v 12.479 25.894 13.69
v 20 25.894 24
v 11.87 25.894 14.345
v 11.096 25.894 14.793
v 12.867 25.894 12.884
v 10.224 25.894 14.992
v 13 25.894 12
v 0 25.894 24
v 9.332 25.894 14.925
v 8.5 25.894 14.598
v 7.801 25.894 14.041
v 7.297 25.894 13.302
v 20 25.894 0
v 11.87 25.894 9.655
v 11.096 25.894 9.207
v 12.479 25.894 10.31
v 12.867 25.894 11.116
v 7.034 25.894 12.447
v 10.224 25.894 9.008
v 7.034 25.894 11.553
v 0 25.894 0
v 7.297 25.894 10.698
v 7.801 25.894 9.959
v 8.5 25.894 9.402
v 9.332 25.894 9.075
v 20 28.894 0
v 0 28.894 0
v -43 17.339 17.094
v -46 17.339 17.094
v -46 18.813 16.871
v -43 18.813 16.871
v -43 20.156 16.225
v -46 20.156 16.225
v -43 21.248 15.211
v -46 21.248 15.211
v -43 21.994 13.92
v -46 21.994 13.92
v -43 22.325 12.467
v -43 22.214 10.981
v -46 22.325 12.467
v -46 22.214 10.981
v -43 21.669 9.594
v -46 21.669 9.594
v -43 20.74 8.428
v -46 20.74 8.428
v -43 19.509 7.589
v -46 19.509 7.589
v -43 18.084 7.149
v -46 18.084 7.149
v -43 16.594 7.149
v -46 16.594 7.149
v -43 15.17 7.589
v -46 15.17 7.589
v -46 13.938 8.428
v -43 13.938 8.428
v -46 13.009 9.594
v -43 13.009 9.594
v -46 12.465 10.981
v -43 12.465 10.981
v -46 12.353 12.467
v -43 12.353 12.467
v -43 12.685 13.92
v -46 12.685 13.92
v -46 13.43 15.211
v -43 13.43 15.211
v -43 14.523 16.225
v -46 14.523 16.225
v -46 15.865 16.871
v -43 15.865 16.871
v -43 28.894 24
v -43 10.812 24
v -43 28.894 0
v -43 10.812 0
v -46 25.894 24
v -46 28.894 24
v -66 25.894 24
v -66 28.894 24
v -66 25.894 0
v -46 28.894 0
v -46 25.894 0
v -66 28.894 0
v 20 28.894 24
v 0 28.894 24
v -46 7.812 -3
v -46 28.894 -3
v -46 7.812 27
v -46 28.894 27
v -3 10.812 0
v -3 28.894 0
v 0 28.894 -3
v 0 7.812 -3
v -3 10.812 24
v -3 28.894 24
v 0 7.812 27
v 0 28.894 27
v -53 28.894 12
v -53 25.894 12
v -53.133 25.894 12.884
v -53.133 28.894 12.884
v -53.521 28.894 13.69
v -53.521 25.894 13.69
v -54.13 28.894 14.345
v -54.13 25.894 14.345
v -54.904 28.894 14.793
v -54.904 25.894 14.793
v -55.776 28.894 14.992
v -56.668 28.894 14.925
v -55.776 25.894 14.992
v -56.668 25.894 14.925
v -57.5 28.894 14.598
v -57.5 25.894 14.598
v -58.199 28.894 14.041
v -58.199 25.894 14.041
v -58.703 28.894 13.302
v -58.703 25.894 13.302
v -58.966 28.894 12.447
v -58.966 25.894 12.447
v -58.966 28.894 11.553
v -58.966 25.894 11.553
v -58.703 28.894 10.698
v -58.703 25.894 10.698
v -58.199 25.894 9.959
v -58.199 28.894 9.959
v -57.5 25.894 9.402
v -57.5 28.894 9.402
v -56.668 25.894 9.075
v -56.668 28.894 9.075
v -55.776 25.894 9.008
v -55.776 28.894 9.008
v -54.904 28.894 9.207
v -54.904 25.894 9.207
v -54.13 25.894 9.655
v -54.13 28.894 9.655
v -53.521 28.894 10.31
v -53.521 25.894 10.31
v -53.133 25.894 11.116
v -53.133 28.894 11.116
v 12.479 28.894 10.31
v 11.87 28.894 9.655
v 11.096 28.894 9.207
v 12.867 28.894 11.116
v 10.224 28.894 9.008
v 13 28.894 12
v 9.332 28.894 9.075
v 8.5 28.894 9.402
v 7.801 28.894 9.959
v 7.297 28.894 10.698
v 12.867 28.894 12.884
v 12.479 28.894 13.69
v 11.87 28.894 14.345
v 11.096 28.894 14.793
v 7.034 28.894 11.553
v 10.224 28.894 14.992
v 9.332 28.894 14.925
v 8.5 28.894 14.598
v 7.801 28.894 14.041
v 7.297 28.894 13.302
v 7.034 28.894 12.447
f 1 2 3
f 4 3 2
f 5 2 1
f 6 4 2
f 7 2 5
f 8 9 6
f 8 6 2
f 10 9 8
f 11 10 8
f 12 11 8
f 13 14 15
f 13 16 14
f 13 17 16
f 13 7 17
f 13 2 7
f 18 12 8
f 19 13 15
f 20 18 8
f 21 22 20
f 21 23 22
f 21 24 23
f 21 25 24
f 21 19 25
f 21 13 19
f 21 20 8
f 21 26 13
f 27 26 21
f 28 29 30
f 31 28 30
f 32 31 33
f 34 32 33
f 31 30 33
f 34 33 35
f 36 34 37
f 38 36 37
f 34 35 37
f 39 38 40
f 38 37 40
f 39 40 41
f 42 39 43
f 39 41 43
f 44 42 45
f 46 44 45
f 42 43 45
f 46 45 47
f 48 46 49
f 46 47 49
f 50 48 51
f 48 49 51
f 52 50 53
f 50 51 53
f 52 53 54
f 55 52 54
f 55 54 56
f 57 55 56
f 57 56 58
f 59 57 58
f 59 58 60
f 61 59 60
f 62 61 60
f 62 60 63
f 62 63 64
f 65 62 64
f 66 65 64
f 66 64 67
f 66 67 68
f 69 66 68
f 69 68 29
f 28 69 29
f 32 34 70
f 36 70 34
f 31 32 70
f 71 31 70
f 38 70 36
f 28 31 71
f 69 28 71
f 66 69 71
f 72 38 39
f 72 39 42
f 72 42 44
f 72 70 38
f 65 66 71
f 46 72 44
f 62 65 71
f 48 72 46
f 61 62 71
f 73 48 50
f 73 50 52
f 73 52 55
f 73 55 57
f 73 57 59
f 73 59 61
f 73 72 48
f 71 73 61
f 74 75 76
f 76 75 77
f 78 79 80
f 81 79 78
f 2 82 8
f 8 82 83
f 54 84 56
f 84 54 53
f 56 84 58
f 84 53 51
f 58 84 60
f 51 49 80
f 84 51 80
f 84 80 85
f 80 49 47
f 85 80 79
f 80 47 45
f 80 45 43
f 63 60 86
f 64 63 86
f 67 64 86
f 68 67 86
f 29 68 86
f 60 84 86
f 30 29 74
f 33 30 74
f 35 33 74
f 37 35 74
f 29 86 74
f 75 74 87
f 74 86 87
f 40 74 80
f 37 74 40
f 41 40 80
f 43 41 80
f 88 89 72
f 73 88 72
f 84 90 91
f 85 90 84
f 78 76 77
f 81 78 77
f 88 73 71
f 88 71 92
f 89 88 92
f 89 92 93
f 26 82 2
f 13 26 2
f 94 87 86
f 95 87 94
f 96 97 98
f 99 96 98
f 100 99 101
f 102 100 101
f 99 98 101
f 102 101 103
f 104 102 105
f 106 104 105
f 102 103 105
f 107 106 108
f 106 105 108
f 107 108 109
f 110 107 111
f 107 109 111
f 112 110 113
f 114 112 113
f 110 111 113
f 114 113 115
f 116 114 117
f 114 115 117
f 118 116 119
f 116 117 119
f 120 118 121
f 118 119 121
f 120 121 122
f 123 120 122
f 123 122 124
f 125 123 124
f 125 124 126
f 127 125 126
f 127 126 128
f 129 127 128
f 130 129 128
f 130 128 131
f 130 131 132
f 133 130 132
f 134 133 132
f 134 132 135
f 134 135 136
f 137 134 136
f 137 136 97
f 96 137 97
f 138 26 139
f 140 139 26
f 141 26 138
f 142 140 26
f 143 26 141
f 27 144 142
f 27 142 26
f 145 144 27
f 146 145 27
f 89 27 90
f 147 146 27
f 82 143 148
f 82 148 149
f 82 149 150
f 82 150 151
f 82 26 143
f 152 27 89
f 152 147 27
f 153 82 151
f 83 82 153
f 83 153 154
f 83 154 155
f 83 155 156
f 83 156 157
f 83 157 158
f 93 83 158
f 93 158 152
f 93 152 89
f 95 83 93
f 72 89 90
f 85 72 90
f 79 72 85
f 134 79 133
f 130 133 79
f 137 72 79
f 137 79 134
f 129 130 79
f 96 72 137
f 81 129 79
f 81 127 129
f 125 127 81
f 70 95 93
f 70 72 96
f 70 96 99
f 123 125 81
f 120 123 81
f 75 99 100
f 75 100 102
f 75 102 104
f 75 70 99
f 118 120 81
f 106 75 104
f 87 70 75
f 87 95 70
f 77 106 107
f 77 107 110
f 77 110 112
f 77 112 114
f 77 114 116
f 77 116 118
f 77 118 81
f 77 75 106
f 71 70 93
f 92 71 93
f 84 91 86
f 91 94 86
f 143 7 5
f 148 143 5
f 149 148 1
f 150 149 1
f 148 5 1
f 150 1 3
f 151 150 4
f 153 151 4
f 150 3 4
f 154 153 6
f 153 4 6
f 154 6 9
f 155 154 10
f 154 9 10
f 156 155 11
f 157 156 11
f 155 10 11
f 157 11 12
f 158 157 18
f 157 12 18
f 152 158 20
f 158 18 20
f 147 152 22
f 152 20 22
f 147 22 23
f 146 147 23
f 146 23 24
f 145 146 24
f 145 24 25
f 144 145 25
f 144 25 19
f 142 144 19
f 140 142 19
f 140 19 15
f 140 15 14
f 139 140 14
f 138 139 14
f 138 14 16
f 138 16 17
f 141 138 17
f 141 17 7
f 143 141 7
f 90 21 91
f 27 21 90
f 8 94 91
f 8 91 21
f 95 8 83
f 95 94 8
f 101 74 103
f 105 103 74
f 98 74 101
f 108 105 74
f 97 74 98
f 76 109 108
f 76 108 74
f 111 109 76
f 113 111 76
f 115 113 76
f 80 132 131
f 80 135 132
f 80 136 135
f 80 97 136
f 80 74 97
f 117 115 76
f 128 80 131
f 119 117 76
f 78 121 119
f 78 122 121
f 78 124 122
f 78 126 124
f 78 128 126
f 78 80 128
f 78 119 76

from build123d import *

# Parameters (mm, degrees)
EXTRUDE_1_DEPTH     = 24
SKETCH_2_W          = 46
SKETCH_2_H          = 21.081573772
EXTRUDE_2_DEPTH     = 3
SKETCH_3_W          = 46
SKETCH_3_H          = 21.081573772
EXTRUDE_3_DEPTH     = 3
SKETCH_6_R          = 5
CUT_EXTRUDE_2_DEPTH = 10
SKETCH_7_R          = 3
CUT_EXTRUDE_3_DEPTH = 10


with BuildPart() as part:
    # 草图1 → 凸台-拉伸1 (new body)
    with BuildSketch(Plane.XY):
        Polygon((-66, 28.893533875), (-43, 28.893533875), (-43, 10.811960103), (-3, 10.811960103), (-3, 28.893533875), (20, 28.893533875), (20, 25.893533875), (0, 25.893533875), (0, 7.811960103), (-46, 7.811960103), (-46, 25.893533875), (-66, 25.893533875), align=None)
    extrude(amount=EXTRUDE_1_DEPTH)

    # 草图2 → 凸台-拉伸2 (add)
    with BuildSketch(Plane.XY.offset(24)):
        with Locations((-23, 18.352746989)):
            Rectangle(SKETCH_2_W, SKETCH_2_H)
    extrude(amount=EXTRUDE_2_DEPTH)

    # 草图3 → 凸台-拉伸3 (add)
    with BuildSketch(Plane(origin=(0, 0, 0), x_dir=(-1, 0, 0), z_dir=(0, 0, -1))):
        with Locations((23, 18.352746989)):
            Rectangle(SKETCH_3_W, SKETCH_3_H)
    extrude(amount=EXTRUDE_3_DEPTH)

    # 草图6 → 切除-拉伸2 (cut)
    with BuildSketch(Plane.ZY.offset(46)):
        with Locations((12.093557596, 17.339206361)):
            Circle(SKETCH_6_R)
    extrude(amount=-CUT_EXTRUDE_2_DEPTH, mode=Mode.SUBTRACT)

    # 草图7 → 切除-拉伸3 (cut)
    with BuildSketch(Plane.XZ.offset(-25.893533875)):
        with Locations((10, 12)):
            Circle(SKETCH_7_R)
        with Locations((-56, 12)):
            Circle(SKETCH_7_R)
    extrude(amount=-CUT_EXTRUDE_3_DEPTH, mode=Mode.SUBTRACT)


solid = part.part
